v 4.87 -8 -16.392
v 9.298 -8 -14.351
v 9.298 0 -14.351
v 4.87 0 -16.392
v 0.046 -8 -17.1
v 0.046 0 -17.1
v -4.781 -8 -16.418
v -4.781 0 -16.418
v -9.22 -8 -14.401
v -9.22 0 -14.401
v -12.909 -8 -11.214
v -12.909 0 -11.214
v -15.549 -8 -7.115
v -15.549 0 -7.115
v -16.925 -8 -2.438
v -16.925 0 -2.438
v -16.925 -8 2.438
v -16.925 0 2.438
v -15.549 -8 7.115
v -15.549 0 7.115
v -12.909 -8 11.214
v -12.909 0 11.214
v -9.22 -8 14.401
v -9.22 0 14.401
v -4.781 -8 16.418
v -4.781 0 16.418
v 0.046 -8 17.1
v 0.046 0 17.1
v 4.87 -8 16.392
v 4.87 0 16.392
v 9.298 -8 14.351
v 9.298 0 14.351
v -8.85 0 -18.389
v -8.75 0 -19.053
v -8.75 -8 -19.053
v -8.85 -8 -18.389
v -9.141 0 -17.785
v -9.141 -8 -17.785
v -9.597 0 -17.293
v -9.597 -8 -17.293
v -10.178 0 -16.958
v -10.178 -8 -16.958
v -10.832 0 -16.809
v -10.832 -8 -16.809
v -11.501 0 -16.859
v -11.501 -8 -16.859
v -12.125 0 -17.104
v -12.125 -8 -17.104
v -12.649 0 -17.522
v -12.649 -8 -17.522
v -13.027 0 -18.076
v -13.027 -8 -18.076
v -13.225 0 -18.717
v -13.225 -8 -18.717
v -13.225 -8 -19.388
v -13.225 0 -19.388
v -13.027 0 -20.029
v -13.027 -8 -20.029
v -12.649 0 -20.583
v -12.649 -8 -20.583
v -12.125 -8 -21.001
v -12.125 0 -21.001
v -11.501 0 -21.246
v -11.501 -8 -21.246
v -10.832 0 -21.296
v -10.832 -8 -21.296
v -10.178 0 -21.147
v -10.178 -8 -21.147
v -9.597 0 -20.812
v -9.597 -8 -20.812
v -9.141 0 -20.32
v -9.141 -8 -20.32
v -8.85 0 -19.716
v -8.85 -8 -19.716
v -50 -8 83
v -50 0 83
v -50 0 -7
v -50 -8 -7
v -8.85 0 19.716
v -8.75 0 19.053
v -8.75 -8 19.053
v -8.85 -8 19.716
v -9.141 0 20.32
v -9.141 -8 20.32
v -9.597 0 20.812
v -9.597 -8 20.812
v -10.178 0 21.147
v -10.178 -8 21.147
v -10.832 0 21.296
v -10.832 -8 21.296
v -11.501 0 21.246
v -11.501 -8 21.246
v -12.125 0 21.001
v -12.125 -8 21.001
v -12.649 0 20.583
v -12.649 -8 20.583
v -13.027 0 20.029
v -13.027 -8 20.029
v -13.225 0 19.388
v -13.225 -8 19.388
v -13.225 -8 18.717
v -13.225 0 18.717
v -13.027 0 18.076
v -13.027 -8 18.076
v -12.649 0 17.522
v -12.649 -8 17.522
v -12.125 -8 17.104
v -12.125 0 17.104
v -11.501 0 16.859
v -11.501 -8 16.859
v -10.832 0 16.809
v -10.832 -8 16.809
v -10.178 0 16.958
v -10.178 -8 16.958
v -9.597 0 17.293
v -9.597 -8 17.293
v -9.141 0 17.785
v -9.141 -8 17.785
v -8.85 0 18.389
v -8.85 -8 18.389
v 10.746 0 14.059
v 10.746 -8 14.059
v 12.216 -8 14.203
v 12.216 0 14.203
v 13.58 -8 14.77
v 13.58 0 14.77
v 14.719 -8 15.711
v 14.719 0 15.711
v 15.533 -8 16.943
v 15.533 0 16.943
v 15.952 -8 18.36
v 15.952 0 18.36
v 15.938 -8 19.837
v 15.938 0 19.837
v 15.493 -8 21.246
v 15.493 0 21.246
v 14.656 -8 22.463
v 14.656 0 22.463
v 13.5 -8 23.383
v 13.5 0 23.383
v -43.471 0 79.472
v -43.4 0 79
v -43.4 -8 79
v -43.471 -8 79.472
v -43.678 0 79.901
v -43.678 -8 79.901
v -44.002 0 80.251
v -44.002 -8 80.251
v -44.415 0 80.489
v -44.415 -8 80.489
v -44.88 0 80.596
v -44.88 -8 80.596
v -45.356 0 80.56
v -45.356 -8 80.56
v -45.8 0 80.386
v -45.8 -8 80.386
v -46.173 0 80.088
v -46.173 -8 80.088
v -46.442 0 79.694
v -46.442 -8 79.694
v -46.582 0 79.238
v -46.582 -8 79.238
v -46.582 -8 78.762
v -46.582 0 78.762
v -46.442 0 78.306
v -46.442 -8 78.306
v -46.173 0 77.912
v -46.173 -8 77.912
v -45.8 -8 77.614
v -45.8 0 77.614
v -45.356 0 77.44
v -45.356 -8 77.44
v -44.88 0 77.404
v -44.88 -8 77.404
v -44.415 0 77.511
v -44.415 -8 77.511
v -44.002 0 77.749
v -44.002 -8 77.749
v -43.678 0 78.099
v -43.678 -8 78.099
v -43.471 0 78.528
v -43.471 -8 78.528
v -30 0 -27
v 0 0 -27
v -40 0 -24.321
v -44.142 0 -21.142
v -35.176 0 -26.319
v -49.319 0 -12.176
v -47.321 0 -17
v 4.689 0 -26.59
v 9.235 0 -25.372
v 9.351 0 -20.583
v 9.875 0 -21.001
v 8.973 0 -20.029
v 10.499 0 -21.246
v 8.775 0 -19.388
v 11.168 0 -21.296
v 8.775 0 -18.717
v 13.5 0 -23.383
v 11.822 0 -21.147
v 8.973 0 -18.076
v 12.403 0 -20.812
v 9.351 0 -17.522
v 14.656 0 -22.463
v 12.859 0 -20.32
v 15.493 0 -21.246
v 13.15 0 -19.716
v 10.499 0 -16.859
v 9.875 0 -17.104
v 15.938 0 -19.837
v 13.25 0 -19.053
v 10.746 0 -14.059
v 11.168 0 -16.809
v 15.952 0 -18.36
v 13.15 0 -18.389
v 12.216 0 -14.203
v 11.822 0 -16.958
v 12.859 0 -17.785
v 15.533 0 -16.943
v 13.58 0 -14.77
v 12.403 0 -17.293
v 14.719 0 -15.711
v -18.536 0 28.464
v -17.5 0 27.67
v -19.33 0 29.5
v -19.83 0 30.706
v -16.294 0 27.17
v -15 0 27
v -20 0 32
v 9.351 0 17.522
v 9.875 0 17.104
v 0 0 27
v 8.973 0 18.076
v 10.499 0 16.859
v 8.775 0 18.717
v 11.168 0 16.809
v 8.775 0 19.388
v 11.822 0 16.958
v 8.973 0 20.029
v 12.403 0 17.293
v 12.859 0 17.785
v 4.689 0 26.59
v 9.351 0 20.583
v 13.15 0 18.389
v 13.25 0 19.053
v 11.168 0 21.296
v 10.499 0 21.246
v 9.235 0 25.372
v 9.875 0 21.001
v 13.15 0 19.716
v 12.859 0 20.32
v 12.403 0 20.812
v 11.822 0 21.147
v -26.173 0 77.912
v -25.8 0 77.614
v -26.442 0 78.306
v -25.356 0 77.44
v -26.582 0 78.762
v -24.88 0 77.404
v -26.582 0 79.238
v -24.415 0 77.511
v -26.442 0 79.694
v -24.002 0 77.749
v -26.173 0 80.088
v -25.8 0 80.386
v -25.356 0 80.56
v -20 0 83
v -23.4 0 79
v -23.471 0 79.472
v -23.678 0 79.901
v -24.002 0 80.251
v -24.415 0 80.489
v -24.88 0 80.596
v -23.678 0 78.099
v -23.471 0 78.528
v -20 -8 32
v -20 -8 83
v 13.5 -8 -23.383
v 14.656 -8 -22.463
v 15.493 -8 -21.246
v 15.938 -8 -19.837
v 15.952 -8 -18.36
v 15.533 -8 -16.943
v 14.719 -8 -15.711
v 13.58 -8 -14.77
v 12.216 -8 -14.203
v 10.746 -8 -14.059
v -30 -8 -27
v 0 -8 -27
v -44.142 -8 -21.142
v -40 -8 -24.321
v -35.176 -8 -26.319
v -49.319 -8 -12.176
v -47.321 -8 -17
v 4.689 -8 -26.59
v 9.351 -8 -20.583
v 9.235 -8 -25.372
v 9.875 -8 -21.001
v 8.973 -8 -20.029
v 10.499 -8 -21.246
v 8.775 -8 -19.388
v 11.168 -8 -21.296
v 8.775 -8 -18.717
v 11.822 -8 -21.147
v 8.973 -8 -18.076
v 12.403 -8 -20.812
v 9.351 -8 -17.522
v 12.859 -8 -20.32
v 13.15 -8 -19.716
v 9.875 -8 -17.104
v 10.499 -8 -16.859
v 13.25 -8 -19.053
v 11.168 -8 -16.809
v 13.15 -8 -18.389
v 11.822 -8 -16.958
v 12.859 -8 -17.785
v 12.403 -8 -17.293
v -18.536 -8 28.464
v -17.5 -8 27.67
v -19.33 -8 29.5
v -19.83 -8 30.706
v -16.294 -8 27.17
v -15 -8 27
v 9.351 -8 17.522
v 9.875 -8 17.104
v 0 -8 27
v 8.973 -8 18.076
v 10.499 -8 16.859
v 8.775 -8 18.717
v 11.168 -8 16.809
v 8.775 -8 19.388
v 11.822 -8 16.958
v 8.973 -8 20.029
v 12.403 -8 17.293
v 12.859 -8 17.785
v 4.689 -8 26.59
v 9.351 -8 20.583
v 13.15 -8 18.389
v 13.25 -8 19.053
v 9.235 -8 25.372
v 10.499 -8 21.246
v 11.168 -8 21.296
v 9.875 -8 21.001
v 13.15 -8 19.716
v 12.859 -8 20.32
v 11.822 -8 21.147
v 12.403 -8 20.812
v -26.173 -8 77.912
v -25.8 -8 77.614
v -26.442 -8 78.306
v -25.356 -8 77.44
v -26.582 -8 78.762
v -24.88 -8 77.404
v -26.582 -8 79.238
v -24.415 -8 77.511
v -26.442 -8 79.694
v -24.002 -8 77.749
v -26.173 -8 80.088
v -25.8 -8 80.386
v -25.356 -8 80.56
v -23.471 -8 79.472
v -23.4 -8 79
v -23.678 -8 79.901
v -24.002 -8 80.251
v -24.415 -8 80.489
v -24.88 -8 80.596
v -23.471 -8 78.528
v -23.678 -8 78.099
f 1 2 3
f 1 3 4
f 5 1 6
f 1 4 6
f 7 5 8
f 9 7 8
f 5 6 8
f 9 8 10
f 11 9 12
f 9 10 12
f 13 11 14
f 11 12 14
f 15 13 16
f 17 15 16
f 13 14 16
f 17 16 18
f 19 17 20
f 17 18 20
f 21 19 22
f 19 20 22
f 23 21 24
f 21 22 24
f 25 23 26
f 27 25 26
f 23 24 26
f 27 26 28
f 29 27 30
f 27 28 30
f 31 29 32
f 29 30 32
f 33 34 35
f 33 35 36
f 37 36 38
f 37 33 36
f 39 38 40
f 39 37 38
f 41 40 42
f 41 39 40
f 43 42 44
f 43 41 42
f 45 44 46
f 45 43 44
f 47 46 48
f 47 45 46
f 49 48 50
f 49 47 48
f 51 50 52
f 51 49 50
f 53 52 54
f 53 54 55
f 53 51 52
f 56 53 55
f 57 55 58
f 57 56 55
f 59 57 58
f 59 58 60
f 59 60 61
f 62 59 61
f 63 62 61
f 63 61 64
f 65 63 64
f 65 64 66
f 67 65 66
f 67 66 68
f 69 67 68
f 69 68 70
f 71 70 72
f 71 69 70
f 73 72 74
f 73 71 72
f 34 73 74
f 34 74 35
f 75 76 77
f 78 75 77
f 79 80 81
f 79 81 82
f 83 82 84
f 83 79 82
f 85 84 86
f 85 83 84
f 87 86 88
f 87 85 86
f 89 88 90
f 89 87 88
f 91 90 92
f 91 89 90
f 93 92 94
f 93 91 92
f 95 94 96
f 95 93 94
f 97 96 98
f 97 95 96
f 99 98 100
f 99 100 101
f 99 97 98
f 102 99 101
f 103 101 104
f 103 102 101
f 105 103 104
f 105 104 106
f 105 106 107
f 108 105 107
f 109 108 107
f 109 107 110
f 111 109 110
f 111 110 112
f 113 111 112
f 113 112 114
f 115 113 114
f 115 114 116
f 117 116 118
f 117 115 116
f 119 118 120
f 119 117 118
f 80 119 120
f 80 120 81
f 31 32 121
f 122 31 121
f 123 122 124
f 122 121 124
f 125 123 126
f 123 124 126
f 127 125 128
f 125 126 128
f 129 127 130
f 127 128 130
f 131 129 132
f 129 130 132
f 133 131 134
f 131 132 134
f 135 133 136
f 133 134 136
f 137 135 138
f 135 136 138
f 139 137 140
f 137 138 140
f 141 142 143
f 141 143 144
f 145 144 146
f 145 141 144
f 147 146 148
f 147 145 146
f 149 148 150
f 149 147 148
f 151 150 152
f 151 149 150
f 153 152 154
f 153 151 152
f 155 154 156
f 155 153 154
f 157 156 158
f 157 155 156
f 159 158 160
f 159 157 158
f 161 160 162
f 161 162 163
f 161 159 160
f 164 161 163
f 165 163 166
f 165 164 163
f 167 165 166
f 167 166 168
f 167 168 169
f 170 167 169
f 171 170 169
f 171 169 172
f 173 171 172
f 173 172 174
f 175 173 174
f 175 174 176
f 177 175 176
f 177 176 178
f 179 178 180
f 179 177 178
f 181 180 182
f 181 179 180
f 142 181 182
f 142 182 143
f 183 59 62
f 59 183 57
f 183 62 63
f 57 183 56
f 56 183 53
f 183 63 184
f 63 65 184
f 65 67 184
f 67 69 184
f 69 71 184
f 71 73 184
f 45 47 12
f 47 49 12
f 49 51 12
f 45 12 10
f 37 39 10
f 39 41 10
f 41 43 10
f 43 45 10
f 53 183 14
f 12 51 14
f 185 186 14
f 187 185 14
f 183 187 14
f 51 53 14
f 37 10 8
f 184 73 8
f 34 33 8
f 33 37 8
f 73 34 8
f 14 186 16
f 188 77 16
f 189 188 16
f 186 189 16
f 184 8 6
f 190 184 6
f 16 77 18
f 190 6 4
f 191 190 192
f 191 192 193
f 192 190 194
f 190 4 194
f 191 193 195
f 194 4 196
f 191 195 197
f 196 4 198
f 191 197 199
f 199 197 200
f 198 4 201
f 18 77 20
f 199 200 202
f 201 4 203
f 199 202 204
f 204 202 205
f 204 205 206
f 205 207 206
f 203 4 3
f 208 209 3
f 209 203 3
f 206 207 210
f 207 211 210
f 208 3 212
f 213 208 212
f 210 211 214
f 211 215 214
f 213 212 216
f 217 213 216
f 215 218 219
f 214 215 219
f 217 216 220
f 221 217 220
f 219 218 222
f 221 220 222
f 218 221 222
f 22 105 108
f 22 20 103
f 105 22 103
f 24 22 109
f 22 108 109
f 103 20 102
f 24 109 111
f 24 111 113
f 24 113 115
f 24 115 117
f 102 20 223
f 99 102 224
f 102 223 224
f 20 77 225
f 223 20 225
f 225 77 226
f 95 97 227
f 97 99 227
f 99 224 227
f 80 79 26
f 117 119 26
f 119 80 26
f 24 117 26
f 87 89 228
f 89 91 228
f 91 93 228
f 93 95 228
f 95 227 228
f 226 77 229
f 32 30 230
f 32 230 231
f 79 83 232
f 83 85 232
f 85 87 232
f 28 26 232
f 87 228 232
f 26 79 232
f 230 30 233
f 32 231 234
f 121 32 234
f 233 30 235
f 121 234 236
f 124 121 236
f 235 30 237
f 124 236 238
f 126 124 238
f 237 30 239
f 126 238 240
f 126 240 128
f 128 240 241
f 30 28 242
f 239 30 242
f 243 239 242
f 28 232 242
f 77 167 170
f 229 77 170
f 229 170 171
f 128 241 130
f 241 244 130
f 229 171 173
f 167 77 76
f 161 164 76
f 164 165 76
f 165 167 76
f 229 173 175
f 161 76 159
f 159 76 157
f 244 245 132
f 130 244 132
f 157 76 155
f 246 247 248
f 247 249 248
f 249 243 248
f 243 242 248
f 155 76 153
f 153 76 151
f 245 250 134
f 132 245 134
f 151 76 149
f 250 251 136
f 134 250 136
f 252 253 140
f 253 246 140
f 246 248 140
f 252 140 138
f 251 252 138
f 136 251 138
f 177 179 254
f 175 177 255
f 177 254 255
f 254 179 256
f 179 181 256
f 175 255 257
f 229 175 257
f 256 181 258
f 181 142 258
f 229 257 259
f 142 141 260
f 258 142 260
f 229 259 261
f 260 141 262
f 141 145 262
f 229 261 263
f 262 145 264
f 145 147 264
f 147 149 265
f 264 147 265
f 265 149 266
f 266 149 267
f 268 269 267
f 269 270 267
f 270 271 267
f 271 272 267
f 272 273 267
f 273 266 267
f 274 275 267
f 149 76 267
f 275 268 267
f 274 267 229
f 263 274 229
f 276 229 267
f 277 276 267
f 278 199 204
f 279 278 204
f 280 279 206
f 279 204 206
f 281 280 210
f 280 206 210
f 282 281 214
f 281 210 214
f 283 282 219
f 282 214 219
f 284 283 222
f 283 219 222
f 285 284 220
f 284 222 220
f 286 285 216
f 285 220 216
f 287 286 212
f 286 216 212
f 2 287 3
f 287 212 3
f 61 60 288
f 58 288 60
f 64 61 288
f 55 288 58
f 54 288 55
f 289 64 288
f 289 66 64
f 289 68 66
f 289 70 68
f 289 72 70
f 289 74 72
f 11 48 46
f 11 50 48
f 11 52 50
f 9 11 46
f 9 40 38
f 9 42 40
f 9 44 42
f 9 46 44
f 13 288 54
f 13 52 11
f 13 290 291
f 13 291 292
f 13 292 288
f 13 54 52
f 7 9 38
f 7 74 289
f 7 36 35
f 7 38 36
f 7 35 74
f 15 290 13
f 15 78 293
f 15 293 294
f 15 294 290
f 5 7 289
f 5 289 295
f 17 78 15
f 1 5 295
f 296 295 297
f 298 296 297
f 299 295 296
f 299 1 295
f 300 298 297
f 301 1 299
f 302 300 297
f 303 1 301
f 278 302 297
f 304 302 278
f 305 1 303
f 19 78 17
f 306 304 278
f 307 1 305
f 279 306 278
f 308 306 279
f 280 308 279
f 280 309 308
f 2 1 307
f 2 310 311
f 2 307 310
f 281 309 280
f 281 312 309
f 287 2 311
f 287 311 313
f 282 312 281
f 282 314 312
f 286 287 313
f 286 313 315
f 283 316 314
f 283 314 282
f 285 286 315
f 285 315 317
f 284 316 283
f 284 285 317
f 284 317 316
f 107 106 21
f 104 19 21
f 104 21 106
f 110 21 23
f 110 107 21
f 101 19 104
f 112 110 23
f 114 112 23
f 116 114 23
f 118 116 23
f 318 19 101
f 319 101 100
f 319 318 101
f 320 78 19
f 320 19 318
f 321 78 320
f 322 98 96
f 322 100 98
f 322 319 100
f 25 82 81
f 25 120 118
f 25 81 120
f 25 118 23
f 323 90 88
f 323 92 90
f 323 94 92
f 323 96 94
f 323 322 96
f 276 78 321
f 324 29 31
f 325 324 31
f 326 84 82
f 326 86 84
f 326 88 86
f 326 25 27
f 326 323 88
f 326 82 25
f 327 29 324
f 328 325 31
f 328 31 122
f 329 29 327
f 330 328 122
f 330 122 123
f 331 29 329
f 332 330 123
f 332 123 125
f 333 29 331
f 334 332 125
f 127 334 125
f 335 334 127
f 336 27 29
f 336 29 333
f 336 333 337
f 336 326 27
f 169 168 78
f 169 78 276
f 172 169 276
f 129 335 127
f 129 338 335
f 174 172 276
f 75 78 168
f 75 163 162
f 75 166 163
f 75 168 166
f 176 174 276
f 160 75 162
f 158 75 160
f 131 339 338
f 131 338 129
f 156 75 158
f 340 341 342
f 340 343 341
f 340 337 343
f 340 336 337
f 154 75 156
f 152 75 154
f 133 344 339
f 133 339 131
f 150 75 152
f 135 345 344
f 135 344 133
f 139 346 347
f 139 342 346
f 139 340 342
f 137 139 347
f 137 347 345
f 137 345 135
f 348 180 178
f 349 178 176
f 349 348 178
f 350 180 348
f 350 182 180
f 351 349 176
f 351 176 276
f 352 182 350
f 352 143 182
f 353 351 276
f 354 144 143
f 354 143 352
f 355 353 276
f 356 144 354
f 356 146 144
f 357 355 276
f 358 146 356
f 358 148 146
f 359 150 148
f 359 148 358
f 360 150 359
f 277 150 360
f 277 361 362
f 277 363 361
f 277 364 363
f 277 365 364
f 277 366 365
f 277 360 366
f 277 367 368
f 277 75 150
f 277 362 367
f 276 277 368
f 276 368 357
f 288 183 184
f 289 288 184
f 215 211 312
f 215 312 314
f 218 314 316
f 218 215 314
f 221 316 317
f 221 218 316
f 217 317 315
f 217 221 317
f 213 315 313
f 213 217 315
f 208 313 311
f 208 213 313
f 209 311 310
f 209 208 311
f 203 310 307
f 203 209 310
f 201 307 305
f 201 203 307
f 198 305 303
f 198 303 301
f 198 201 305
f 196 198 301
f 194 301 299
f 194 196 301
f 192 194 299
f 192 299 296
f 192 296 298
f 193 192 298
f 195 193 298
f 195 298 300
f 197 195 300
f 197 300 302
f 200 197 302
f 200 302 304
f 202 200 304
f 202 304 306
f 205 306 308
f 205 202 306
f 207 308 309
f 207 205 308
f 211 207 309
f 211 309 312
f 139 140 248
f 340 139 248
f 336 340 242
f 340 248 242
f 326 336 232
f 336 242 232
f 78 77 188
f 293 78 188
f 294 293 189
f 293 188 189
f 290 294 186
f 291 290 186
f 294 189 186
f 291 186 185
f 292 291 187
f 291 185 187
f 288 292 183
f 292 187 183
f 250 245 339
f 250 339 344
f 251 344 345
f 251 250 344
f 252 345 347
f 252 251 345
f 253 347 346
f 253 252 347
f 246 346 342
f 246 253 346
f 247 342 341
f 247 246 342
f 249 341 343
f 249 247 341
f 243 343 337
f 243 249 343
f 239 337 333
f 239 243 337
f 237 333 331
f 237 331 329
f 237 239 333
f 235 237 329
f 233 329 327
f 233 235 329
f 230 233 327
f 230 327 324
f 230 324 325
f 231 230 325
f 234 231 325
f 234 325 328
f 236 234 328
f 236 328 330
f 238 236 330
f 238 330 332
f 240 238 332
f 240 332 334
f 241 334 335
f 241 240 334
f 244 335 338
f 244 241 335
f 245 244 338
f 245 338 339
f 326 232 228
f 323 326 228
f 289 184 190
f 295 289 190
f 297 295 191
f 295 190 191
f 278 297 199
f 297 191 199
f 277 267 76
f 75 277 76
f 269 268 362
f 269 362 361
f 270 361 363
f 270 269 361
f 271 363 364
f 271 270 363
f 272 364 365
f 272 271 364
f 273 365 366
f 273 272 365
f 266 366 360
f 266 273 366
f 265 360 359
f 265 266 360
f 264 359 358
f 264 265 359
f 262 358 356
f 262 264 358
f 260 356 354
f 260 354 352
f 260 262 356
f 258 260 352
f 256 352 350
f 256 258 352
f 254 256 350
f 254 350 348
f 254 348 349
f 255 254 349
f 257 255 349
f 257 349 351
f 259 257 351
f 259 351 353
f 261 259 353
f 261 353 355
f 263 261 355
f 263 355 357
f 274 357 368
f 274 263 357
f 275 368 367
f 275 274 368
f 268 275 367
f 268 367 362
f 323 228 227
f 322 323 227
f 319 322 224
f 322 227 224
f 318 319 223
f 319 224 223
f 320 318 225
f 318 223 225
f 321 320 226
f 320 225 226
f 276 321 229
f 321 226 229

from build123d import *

# Parameters (mm, degrees)
F0_R     = 2.25
F0_R_2   = 1.6
F1_DEPTH = 8


with BuildPart() as f1:
    # F0 (on Front) → F1 (new body)
    with BuildSketch(Plane.XZ):
        with BuildLine():
            ThreePointArc((9.298187, -14.351087), (-17.1, 0), (9.298187, 14.351087))
            ThreePointArc((9.298187, 14.351087), (15.5334, 16.943464), (13.5, 23.382686))
            ThreePointArc((13.5, 23.382686), (6.988114, 26.079997), (0, 27))
            Line((0, 27), (-15, 27))
            ThreePointArc((-15, 27), (-18.535534, 28.464466), (-20, 32))
            Line((-20, 32), (-20, 83))
            Line((-20, 83), (-50, 83))
            Line((-50, 83), (-50, -7))
            ThreePointArc((-50, -7), (-44.142136, -21.142136), (-30, -27))
            Line((-30, -27), (0, -27))
            ThreePointArc((0, -27), (6.988114, -26.079997), (13.5, -23.382686))
            ThreePointArc((13.5, -23.382686), (15.5334, -16.943464), (9.298187, -14.351087))
        make_face()
        with Locations((-11, -19.052559)):
            Circle(F0_R, mode=Mode.SUBTRACT)
        with Locations((11, -19.052559)):
            Circle(F0_R, mode=Mode.SUBTRACT)
        with Locations((-11, 19.052559)):
            Circle(F0_R, mode=Mode.SUBTRACT)
        with Locations((11, 19.052559)):
            Circle(F0_R, mode=Mode.SUBTRACT)
        with Locations((-45, 79)):
            Circle(F0_R_2, mode=Mode.SUBTRACT)
        with Locations((-25, 79)):
            Circle(F0_R_2, mode=Mode.SUBTRACT)
    extrude(amount=F1_DEPTH)


solid = f1.part
